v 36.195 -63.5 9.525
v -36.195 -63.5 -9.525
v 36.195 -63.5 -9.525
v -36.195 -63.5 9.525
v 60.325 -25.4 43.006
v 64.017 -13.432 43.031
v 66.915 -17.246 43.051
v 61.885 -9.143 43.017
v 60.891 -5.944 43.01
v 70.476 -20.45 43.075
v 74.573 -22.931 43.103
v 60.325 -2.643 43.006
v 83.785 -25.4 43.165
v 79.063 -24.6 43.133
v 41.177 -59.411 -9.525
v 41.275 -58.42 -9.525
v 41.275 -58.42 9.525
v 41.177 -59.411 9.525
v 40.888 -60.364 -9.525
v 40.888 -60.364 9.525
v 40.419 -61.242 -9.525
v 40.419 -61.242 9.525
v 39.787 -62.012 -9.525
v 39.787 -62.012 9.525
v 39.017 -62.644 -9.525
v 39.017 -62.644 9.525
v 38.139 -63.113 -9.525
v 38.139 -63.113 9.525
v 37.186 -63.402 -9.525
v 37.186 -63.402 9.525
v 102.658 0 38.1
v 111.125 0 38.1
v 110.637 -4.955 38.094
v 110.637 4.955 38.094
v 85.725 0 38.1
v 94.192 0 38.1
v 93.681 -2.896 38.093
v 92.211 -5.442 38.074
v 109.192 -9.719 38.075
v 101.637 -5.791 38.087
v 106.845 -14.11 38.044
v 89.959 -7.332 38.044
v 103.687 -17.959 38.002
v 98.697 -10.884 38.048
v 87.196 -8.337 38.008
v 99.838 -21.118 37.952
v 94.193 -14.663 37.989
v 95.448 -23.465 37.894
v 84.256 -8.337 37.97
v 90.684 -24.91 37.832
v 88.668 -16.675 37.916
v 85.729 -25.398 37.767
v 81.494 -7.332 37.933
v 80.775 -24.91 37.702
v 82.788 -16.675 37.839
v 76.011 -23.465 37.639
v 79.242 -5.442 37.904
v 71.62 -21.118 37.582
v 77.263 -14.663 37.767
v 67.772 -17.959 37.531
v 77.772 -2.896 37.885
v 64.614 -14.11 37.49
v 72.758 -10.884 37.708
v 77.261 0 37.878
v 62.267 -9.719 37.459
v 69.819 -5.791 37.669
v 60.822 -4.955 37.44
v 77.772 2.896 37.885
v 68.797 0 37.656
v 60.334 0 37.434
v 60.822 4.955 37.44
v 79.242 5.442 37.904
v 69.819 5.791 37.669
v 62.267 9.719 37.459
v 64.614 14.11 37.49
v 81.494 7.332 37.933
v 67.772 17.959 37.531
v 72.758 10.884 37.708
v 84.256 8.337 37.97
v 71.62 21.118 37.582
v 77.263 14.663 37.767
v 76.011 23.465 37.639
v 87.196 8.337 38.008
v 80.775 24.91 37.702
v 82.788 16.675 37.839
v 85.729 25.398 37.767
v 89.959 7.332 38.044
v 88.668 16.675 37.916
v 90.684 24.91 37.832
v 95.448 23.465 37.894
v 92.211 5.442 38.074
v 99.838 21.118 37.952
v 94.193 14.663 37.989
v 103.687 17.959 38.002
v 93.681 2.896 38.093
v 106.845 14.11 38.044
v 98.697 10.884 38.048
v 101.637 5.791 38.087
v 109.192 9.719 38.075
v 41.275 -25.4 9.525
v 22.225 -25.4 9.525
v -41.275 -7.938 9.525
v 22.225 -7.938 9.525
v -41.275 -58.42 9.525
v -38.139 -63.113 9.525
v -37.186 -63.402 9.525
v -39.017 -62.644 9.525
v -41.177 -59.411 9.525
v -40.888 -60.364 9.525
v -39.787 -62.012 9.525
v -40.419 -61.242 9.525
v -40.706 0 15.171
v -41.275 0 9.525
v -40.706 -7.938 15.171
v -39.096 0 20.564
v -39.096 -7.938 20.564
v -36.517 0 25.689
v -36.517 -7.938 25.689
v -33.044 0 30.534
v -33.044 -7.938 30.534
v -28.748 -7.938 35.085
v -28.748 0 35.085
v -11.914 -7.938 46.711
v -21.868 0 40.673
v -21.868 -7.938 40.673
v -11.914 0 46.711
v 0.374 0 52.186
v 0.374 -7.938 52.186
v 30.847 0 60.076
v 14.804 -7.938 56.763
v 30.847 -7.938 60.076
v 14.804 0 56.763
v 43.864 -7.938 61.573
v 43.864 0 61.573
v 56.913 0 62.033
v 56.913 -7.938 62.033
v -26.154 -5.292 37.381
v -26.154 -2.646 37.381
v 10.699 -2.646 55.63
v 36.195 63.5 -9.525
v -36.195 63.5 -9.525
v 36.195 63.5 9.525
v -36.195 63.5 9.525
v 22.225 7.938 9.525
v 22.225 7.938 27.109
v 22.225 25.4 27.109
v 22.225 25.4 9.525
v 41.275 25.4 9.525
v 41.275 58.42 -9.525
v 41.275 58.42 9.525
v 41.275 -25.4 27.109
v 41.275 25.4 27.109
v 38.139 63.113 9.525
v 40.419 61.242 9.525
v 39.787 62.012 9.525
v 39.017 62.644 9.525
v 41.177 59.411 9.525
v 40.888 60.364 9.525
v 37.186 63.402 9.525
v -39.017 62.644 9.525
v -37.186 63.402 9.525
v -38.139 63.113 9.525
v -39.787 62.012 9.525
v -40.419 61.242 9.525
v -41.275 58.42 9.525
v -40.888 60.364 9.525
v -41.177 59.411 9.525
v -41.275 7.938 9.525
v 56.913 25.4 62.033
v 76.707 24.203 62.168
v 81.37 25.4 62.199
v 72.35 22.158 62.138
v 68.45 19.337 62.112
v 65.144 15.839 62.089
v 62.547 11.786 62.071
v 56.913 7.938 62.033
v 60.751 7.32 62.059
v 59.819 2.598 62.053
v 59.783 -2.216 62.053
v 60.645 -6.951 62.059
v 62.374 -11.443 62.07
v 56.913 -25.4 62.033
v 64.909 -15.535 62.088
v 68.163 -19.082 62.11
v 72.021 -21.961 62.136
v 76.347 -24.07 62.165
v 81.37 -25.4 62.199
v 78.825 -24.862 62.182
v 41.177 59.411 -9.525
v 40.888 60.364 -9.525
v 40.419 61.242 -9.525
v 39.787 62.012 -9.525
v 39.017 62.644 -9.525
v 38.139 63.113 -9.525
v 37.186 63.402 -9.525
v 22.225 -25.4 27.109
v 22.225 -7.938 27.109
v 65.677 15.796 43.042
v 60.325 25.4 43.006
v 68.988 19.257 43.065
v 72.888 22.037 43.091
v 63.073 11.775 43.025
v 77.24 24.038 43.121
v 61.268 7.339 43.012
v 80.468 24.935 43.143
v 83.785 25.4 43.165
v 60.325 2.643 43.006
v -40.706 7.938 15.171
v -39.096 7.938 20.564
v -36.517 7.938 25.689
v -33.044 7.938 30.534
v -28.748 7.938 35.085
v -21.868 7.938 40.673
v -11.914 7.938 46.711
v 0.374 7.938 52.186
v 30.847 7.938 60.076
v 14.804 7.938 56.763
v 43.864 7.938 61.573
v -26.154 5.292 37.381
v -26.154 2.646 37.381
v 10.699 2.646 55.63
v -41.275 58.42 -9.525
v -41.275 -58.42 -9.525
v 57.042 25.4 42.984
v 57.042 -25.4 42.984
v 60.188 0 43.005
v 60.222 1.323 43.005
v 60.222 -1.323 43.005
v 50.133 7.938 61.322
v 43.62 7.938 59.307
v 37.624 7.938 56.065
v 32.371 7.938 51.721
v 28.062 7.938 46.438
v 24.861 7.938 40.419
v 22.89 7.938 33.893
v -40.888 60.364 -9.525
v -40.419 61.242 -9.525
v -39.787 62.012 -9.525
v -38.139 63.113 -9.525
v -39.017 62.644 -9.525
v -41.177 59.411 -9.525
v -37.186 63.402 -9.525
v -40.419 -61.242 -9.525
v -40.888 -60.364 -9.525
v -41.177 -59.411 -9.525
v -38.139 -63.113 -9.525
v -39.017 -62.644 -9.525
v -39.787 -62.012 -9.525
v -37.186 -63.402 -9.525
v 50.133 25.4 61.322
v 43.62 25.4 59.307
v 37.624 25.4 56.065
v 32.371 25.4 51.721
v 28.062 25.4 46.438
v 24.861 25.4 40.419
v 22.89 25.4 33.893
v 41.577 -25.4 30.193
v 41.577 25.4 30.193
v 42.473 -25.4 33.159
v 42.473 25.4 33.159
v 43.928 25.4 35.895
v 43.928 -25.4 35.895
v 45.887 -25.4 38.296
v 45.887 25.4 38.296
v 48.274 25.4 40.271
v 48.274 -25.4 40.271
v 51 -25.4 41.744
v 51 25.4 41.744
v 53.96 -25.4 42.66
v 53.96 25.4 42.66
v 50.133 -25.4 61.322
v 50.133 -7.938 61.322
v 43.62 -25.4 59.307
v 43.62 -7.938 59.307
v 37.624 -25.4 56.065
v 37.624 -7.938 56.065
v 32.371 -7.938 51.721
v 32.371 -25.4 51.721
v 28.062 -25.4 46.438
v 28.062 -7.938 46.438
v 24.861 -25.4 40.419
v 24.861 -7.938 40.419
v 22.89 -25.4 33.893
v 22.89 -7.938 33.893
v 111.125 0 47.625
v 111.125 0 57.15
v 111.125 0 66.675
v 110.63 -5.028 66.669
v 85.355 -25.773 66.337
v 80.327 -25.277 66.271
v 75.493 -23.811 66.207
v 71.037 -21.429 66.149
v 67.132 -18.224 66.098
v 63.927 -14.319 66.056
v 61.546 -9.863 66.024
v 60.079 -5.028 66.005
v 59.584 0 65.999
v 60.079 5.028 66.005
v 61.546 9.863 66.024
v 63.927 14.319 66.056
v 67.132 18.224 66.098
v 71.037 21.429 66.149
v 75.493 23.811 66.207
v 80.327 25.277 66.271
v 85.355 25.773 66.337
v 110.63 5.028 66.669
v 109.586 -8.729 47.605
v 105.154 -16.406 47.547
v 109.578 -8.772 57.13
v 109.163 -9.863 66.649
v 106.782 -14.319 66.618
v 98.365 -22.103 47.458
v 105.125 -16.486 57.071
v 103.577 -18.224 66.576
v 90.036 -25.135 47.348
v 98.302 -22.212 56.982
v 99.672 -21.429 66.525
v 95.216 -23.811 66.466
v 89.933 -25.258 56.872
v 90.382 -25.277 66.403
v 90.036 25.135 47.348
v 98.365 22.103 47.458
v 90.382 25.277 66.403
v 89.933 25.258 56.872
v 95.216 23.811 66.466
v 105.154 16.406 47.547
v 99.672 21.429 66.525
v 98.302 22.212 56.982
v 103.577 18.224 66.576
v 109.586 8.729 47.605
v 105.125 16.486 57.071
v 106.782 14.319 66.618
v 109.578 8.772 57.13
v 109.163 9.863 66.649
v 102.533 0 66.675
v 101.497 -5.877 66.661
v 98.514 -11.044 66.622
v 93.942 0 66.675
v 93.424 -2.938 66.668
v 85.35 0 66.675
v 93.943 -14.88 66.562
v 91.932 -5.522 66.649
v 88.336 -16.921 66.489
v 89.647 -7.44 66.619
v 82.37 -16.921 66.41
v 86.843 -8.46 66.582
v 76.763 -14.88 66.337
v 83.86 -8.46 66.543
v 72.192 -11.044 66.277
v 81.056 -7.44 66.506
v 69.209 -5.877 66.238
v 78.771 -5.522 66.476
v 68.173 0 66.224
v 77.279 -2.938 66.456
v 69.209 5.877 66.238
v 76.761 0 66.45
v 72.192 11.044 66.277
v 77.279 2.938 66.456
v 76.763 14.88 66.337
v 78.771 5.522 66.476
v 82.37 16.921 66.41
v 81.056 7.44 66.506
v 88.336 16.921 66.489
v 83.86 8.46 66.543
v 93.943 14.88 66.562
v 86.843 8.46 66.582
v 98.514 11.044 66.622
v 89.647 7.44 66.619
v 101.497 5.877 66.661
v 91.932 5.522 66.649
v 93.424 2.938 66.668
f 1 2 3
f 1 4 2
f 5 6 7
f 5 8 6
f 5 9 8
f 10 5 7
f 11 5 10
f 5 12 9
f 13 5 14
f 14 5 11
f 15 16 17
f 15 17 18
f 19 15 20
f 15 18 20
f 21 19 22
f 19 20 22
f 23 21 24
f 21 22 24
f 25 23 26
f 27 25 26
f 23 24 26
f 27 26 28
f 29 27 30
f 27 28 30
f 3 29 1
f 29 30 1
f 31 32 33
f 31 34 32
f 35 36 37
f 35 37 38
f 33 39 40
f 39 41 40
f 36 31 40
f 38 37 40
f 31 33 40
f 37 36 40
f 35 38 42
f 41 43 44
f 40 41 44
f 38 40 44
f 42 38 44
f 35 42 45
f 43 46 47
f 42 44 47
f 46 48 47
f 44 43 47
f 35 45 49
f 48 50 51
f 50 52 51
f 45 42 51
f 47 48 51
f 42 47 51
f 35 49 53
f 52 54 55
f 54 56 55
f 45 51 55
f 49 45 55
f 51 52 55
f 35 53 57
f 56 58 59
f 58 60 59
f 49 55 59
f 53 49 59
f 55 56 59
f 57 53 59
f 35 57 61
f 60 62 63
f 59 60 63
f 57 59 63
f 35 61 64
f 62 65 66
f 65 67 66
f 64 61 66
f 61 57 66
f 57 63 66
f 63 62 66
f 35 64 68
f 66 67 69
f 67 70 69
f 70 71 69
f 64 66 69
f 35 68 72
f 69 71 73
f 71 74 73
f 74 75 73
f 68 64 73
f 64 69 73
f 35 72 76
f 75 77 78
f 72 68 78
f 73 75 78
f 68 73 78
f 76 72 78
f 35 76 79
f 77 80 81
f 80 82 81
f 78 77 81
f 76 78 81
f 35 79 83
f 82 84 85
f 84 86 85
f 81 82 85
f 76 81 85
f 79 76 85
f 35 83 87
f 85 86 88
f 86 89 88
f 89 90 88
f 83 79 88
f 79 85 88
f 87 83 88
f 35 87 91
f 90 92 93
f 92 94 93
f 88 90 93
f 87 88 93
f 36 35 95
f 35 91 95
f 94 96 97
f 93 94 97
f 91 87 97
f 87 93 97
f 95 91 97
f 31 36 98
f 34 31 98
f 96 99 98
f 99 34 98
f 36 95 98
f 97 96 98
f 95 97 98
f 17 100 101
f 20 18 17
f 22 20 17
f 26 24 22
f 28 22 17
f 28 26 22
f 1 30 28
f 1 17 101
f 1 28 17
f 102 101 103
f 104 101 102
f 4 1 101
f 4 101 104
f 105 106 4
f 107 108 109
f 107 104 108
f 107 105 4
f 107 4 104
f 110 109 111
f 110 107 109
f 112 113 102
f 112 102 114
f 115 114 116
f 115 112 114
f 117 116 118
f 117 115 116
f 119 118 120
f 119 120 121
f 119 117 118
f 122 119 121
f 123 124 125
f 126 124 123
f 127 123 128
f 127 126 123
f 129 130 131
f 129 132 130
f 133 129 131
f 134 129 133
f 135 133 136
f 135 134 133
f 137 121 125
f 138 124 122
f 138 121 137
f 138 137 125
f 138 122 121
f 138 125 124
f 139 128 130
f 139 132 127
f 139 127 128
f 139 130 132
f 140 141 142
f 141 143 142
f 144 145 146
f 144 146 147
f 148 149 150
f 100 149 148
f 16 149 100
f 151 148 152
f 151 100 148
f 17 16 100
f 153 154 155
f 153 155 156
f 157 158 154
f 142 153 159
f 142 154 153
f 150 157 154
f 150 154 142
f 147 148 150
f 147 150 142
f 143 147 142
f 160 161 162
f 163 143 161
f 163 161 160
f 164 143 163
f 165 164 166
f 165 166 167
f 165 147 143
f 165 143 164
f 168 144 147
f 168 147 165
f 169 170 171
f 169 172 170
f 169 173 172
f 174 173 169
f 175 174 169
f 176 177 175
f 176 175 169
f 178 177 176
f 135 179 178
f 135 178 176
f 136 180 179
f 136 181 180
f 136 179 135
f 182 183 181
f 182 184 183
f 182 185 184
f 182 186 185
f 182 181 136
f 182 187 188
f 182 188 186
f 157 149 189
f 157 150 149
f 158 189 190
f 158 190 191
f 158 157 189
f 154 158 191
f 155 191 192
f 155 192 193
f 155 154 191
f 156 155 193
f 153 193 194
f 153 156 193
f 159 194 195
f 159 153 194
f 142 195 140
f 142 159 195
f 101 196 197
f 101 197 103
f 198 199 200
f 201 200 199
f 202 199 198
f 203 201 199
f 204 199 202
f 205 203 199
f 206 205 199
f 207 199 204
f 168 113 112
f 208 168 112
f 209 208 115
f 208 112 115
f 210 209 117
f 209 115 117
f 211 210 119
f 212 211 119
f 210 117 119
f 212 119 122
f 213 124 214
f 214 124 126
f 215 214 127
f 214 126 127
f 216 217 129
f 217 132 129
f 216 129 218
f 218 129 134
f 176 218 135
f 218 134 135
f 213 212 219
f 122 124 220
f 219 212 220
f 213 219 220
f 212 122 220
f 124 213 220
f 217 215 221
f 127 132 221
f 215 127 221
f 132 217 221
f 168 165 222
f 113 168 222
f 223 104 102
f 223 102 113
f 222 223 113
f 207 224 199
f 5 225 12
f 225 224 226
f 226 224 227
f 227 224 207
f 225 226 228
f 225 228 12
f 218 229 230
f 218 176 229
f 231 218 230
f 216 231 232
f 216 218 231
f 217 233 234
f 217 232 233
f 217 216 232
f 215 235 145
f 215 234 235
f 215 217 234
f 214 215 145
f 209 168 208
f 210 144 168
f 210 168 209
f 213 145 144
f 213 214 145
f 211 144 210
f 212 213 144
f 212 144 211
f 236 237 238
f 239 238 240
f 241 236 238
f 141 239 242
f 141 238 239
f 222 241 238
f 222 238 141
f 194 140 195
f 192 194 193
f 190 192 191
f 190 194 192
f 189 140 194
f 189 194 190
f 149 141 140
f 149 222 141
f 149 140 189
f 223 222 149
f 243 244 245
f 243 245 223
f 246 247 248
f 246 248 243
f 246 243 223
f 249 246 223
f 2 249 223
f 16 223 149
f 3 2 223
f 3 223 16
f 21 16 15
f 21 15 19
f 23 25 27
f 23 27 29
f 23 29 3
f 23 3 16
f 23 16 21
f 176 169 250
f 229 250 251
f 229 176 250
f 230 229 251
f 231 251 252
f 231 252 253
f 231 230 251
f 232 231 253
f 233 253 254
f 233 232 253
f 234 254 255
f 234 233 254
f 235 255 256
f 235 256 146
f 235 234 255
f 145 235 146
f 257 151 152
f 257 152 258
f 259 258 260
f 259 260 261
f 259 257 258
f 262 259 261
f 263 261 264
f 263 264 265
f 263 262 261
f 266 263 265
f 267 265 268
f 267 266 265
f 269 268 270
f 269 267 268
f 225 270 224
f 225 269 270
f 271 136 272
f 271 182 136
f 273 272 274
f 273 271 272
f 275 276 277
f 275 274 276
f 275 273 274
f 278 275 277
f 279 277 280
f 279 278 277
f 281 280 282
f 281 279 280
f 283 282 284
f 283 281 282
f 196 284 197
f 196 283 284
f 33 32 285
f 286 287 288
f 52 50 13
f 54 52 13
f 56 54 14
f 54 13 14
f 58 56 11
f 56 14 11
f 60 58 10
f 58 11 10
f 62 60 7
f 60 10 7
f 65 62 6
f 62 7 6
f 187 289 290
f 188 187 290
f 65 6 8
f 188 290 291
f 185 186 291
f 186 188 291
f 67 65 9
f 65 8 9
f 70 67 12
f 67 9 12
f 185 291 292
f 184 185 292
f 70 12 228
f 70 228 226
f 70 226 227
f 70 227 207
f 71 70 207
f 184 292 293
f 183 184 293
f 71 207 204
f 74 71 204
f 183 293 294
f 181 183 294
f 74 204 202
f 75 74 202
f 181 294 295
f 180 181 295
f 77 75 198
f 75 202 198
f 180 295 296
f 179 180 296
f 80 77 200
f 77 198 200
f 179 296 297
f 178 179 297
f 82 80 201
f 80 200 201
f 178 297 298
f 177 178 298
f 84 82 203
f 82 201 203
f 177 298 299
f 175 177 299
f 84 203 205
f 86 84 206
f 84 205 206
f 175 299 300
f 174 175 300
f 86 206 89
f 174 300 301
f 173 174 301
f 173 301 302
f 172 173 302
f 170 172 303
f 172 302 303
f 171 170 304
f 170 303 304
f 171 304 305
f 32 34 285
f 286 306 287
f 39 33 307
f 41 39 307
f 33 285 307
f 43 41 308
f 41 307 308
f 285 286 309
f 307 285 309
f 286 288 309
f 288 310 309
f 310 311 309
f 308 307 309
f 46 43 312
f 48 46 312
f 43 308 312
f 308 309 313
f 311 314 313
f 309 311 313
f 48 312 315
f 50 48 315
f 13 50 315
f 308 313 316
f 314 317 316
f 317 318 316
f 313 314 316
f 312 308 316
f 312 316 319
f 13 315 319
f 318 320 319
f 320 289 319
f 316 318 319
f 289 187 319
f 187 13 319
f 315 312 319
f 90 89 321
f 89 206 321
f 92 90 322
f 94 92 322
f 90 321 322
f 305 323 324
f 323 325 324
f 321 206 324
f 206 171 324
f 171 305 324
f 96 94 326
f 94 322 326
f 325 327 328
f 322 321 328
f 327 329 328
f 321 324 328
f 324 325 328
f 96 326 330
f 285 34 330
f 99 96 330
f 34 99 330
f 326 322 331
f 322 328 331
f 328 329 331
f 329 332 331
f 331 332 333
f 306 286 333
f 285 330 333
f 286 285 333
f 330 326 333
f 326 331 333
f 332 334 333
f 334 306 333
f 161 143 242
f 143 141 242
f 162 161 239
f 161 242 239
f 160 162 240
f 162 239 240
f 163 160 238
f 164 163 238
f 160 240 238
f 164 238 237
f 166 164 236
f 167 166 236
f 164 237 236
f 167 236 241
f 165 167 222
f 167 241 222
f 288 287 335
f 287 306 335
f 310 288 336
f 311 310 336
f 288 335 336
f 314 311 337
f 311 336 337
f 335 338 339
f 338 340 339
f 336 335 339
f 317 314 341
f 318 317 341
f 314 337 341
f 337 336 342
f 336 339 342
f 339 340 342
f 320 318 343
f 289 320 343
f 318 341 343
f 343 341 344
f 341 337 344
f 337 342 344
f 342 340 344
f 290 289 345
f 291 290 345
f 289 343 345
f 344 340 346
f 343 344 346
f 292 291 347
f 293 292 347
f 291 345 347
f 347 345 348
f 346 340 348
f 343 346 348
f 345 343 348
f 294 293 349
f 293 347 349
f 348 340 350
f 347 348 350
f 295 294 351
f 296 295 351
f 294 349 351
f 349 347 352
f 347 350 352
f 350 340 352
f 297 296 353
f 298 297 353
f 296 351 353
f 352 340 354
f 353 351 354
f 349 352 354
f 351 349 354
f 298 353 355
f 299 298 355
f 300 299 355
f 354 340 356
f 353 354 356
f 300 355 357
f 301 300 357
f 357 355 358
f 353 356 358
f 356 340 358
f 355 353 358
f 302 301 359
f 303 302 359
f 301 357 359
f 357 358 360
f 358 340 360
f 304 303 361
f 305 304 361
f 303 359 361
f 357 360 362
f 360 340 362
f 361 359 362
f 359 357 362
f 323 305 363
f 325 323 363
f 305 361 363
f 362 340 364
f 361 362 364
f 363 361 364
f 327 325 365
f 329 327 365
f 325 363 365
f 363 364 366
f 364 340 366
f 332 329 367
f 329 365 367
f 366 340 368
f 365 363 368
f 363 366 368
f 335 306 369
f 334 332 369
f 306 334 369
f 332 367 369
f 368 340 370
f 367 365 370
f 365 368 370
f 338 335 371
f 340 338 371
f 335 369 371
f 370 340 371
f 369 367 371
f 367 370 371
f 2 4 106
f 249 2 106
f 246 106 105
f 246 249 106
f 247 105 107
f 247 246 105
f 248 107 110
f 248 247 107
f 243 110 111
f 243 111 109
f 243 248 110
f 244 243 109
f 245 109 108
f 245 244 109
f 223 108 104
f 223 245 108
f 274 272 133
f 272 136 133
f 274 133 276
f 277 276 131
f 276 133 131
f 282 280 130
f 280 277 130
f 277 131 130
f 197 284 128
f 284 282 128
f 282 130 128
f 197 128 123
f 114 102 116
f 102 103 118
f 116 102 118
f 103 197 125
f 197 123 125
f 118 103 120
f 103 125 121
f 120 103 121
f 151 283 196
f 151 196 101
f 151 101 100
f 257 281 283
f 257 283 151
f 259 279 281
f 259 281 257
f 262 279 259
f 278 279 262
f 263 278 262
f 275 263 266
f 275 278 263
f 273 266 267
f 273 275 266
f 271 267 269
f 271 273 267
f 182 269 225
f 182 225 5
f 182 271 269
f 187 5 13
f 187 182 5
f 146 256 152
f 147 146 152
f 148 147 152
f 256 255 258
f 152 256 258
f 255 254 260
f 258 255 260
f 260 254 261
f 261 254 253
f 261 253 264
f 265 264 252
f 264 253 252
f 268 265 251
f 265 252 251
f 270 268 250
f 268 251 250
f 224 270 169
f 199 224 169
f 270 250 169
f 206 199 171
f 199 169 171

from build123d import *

# Parameters (mm, degrees)
F1_DEPTH = 63.5
F2_DEPTH = 25.4
F3_DEPTH = 7.9375
F5_R     = 5.08


with BuildPart() as f1:
    # F0 (on Front) → F1 (new body, symmetric)
    with BuildSketch(Plane.XZ):
        Polygon((22.225, 9.525), (-41.275, 9.525), (-41.275, -9.525), (41.275, -9.525), (41.275, 9.525), align=None)
    extrude(amount=F1_DEPTH, both=True)

    # F0 (on Front) → F2 (join, symmetric)
    with BuildSketch(Plane.XZ):
        with BuildLine():
            Line((22.225, 27.1089508341), (22.225, 9.525))
            Line((22.225, 9.525), (41.275, 9.525))
            Line((41.275, 9.525), (41.275, 27.1089508341))
            ThreePointArc((41.275, 27.1089508341), (45.8865944339, 38.2960559133), (57.0420954398, 42.9835841088))
            Line((57.0420954398, 42.9835841088), (60.325, 43.0058989785))
            Line((60.325, 43.0058989785), (60.325, 62.056339059))
            Line((60.325, 62.056339059), (56.9126099675, 62.0331440384))
            ThreePointArc((56.9126099675, 62.0331440384), (32.3705077545, 51.7205820083), (22.225, 27.1089508341))
        make_face()
        Polygon((85.3500794925, 62.2264418986), (60.325, 62.056339059), (60.325, 43.0058989785), (85.4795649648, 43.176881969), (85.3787372937, 61.4743826337), align=None)
    extrude(amount=F2_DEPTH, both=True)

    # F0 (on Front) → F3 (join, symmetric)
    with BuildSketch(Plane.XZ):
        with BuildLine():
            add(Edge.make_bspline(
                [(-41.275, 9.525), (-41.1433540285, 41.4384305477), (10.1432753727, 62.2998327017), (56.9126099675, 62.0331440384)],
                knots=[0, 0, 0, 0, 111.3459112023, 111.3459112023, 111.3459112023, 111.3459112023], degree=3))
            Line((-41.275, 9.525), (22.225, 9.525))
            Line((22.225, 9.525), (22.225, 27.1089508341))
            ThreePointArc((22.225, 27.1089508341), (32.3705077545, 51.7205820083), (56.9126099675, 62.0331440384))
        make_face()
    extrude(amount=F3_DEPTH, both=True)

    # F0 (on Front) → F4 (revolve)
    with BuildSketch(Plane.XZ):
        Polygon((111.125, 66.675), (85.3500794925, 66.675), (85.4390979857, 59.8903526073), (85.725, 38.1), (111.125, 38.1), align=None)
    revolve(axis=Axis((85.5375397462, 0, 52.3875), (0.0131194485, 0, -0.9999139363)))

    # F5
    f5_edges = [f1.edges().sort_by_distance(p)[0] for p in [
        (41.275, -63.5, 0),
        (-41.275, -63.5, 0),
        (-41.275, 63.5, 0),
        (41.275, 63.5, 0),
    ]]
    fillet(f5_edges, radius=F5_R)


solid = f1.part
